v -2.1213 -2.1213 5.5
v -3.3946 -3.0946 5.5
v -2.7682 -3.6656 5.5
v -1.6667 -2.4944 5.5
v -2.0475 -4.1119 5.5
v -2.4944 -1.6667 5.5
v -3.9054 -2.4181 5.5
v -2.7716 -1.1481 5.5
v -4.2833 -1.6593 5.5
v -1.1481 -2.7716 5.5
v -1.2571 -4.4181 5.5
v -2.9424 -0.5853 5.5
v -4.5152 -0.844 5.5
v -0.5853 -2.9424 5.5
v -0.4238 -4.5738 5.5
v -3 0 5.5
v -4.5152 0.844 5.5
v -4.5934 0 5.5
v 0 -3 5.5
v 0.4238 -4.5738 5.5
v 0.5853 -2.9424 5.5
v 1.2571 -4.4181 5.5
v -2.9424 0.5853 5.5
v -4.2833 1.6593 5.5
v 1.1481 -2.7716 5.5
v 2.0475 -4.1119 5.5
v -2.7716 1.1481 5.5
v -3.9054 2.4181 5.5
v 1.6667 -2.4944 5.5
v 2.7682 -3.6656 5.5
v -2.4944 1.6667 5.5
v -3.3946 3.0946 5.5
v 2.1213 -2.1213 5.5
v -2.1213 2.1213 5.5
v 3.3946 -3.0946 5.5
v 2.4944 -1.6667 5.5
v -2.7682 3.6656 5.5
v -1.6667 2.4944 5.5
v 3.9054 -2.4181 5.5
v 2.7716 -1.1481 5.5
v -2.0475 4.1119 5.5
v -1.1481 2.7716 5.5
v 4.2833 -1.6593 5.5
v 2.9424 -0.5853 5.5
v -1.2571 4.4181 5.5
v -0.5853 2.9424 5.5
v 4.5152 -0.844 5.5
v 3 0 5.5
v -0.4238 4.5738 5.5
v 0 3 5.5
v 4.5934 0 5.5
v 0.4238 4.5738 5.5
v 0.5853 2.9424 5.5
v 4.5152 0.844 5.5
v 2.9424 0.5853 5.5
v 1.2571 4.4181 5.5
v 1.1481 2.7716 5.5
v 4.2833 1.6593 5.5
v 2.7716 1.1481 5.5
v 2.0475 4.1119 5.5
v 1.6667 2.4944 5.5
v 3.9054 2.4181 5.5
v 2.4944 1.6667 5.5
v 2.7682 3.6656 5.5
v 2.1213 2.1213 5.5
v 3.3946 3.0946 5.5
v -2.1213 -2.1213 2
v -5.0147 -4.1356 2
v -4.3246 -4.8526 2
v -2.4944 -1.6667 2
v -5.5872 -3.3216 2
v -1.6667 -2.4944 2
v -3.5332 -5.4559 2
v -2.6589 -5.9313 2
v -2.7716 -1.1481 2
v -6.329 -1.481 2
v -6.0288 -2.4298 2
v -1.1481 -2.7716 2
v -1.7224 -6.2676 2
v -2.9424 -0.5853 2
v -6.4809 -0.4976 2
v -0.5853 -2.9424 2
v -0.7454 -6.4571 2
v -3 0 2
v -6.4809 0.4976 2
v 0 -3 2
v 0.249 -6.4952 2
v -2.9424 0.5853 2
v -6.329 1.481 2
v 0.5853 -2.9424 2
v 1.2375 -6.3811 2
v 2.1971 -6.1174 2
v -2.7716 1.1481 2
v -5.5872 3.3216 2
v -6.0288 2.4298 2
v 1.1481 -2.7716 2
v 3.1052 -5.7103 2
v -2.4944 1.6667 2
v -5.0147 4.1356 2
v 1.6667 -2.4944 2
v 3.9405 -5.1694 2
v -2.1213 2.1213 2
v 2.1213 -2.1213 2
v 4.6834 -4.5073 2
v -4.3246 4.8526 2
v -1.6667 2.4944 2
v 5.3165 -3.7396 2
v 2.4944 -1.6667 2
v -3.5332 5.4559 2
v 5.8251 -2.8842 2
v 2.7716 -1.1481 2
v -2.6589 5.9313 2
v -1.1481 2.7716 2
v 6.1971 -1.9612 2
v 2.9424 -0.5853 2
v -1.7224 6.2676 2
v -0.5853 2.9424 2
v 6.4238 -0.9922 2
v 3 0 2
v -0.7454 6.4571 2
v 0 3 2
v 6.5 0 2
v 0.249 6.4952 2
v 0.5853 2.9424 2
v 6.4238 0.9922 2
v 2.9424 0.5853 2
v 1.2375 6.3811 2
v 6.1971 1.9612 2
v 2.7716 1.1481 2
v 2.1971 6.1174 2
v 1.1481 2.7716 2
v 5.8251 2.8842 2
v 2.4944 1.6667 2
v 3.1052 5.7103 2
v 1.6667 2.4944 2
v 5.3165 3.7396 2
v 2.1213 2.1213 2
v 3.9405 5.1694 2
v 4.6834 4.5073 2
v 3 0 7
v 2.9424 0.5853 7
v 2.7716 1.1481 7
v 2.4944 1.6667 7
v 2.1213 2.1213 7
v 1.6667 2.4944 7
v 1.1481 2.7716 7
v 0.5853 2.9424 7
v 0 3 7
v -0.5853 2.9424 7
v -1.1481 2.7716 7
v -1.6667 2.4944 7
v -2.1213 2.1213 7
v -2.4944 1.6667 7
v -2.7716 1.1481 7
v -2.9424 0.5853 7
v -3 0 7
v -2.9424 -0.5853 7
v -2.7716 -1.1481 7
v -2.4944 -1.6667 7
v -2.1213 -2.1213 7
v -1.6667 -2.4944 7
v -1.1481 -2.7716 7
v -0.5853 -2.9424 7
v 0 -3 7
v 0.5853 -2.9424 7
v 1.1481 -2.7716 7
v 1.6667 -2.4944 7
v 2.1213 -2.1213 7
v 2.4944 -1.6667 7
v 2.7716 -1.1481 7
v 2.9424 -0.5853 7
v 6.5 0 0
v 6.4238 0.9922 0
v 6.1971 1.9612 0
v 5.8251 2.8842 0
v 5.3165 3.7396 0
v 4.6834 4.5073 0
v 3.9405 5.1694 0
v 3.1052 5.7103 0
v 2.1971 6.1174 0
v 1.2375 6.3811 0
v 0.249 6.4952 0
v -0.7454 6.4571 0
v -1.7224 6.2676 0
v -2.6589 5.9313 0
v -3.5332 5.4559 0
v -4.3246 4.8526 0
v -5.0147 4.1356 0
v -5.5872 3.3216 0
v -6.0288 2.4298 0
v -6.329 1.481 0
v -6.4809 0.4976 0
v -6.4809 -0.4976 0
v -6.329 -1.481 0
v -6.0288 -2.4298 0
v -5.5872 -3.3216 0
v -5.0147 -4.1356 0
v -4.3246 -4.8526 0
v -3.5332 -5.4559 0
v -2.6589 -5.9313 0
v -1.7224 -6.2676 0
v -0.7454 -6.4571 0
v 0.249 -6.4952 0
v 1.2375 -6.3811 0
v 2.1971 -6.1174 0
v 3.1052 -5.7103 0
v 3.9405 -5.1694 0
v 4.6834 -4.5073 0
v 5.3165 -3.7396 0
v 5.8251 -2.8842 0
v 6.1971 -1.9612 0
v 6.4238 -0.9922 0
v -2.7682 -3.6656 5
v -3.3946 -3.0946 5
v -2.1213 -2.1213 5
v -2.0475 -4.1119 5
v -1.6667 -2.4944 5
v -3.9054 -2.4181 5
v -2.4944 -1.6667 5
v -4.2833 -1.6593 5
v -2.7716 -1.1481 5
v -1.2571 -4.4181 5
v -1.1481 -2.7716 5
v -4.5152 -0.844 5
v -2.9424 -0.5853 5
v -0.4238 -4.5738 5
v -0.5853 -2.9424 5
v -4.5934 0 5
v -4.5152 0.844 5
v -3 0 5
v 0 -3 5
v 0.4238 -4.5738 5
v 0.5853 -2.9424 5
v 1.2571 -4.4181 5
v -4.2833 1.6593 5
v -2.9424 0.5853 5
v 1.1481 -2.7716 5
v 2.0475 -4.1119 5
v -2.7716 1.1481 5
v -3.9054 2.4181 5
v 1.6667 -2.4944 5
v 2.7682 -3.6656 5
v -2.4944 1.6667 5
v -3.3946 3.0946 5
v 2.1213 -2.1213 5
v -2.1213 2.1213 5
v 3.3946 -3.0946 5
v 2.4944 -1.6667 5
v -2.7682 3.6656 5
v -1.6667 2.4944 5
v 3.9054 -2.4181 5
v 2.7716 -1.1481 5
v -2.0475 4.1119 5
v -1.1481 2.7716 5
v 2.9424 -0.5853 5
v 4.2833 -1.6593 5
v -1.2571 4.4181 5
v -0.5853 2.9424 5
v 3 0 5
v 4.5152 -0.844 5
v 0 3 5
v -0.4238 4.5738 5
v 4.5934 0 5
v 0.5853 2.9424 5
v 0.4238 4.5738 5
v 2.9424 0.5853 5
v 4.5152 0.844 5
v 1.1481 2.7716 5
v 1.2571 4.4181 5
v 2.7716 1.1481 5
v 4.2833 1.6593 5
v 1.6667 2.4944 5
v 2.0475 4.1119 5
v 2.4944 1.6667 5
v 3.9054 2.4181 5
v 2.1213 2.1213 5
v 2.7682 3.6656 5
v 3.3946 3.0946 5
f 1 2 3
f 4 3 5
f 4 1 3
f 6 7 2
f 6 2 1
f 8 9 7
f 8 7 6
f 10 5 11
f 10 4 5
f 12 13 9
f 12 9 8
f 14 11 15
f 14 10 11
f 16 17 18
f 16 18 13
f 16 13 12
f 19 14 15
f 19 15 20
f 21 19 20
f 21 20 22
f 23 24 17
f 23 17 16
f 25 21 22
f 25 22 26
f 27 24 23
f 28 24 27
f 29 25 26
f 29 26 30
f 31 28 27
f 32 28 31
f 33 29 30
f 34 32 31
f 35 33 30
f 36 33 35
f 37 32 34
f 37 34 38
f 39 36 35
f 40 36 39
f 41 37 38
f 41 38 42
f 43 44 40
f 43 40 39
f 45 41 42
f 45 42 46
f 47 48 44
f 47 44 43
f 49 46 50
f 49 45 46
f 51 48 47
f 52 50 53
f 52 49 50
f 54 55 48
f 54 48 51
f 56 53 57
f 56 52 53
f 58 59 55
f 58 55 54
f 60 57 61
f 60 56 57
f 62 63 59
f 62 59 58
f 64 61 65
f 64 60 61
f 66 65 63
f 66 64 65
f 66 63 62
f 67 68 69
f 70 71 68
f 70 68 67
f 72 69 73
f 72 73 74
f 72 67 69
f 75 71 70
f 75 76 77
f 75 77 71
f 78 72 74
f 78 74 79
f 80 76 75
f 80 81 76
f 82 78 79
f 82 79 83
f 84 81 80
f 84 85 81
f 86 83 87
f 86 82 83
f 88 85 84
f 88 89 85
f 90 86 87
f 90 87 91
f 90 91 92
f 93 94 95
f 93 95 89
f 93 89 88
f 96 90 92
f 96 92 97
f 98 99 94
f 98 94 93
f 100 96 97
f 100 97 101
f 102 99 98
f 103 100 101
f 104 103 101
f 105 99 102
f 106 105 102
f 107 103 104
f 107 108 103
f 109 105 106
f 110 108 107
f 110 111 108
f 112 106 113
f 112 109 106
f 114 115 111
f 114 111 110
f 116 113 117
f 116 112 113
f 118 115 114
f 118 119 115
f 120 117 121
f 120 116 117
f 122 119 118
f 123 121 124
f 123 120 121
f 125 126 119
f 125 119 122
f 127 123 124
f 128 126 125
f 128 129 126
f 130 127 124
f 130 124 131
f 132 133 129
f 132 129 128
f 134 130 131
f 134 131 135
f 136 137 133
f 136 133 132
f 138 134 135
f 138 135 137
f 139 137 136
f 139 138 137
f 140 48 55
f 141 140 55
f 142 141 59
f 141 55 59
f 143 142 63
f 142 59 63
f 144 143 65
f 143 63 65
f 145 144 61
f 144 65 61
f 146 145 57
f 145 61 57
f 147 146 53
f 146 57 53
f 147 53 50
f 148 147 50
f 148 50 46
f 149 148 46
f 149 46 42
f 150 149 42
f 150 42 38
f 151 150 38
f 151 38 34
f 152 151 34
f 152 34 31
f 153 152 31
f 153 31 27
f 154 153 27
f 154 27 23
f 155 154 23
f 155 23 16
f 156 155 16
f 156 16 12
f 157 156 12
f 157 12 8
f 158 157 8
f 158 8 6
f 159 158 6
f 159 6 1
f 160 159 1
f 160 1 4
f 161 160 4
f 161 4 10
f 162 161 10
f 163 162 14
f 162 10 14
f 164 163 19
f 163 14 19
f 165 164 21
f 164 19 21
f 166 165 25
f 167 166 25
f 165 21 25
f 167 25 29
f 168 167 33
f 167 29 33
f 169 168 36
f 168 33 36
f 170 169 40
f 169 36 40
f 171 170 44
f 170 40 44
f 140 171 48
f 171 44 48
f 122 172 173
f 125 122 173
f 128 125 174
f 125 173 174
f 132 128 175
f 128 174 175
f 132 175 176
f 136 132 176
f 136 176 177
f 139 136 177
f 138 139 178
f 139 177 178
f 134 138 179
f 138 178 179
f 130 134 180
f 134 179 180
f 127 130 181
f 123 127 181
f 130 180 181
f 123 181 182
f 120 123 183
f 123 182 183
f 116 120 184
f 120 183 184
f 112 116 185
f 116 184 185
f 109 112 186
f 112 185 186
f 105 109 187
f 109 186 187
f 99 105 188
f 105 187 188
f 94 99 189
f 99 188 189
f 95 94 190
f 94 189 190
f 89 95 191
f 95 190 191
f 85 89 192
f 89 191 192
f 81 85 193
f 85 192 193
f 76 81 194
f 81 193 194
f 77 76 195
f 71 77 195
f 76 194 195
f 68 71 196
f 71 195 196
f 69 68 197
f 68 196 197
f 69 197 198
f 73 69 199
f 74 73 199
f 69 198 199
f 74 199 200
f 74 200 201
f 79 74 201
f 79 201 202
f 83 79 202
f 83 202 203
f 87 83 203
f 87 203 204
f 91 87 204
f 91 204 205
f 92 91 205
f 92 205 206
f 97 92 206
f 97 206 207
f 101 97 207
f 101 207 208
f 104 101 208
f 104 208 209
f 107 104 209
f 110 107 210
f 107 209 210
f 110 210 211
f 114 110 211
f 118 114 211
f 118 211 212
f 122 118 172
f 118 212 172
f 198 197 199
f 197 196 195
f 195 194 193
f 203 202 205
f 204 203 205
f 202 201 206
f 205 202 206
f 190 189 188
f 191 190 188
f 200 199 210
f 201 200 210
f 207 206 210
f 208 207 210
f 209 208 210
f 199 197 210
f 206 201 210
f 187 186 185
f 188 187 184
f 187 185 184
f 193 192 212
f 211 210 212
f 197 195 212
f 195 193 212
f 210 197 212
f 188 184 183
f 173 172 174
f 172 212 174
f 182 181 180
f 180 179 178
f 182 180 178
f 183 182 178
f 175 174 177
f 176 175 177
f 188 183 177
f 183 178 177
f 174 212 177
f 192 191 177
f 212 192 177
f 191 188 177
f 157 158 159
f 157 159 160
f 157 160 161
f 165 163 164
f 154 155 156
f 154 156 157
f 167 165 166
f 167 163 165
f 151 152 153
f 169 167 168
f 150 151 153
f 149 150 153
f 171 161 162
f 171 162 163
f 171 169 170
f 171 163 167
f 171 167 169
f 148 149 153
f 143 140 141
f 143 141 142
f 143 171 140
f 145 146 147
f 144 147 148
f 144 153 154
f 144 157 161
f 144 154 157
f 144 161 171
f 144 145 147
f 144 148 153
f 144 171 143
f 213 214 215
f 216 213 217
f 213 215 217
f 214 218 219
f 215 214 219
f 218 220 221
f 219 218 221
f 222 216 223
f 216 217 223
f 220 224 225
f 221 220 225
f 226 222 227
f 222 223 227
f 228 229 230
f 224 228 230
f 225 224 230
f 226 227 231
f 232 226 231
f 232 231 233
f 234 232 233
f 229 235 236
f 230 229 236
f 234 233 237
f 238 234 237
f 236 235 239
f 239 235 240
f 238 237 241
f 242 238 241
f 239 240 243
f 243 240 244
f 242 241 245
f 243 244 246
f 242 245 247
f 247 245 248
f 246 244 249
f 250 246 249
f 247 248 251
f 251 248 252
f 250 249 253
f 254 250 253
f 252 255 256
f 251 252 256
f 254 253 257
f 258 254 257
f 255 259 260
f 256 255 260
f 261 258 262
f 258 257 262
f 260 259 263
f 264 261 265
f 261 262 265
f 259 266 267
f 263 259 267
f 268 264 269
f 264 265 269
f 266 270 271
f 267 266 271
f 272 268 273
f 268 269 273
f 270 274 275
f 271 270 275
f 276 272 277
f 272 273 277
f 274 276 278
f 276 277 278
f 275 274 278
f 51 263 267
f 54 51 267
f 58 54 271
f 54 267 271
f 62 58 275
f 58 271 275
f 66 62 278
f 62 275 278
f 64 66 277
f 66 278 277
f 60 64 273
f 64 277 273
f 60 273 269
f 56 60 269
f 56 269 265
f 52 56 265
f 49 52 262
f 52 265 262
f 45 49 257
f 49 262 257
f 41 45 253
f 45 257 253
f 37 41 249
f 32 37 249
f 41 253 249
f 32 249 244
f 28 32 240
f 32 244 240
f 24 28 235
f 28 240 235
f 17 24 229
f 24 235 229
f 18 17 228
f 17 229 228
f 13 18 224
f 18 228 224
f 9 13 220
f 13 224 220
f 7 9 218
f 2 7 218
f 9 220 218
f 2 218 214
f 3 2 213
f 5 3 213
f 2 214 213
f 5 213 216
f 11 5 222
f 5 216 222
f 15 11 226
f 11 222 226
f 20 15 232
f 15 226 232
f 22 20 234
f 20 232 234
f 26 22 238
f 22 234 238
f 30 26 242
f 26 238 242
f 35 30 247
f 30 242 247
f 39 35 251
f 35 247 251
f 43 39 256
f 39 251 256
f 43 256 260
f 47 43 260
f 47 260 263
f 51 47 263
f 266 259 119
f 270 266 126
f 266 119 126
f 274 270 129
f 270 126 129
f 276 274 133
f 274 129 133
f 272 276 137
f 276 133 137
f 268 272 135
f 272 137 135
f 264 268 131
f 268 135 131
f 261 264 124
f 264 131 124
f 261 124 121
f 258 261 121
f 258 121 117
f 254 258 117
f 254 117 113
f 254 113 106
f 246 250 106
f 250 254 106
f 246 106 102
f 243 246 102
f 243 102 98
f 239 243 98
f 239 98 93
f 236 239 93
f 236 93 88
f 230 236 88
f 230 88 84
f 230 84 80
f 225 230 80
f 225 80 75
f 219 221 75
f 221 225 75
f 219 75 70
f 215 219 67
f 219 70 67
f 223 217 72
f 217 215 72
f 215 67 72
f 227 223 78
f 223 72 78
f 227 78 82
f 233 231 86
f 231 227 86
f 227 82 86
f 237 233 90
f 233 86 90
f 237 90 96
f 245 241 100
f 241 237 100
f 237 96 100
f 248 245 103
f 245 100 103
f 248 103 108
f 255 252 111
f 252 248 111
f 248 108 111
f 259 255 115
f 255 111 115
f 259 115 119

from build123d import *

# Parameters (mm, degrees)
F0_R     = 6.5
F1_DEPTH = 2
F2_R     = 3
F3_DEPTH = 5
F5_R     = 4.593438
F6_DEPTH = 0.5


with BuildPart() as f1:
    # F0 (on Top) → F1 (new body)
    with BuildSketch(Plane.XY):
        Circle(F0_R)
    extrude(amount=F1_DEPTH)

    # F2 (on face) → F3 (join)
    with BuildSketch(Plane.XY.offset(2)):
        Circle(F2_R)
    extrude(amount=F3_DEPTH)

    # F5 (on offset) → F6 (join)
    with BuildSketch(Plane.XY.offset(5)):
        Circle(F5_R)
    extrude(amount=F6_DEPTH)


solid = f1.part
